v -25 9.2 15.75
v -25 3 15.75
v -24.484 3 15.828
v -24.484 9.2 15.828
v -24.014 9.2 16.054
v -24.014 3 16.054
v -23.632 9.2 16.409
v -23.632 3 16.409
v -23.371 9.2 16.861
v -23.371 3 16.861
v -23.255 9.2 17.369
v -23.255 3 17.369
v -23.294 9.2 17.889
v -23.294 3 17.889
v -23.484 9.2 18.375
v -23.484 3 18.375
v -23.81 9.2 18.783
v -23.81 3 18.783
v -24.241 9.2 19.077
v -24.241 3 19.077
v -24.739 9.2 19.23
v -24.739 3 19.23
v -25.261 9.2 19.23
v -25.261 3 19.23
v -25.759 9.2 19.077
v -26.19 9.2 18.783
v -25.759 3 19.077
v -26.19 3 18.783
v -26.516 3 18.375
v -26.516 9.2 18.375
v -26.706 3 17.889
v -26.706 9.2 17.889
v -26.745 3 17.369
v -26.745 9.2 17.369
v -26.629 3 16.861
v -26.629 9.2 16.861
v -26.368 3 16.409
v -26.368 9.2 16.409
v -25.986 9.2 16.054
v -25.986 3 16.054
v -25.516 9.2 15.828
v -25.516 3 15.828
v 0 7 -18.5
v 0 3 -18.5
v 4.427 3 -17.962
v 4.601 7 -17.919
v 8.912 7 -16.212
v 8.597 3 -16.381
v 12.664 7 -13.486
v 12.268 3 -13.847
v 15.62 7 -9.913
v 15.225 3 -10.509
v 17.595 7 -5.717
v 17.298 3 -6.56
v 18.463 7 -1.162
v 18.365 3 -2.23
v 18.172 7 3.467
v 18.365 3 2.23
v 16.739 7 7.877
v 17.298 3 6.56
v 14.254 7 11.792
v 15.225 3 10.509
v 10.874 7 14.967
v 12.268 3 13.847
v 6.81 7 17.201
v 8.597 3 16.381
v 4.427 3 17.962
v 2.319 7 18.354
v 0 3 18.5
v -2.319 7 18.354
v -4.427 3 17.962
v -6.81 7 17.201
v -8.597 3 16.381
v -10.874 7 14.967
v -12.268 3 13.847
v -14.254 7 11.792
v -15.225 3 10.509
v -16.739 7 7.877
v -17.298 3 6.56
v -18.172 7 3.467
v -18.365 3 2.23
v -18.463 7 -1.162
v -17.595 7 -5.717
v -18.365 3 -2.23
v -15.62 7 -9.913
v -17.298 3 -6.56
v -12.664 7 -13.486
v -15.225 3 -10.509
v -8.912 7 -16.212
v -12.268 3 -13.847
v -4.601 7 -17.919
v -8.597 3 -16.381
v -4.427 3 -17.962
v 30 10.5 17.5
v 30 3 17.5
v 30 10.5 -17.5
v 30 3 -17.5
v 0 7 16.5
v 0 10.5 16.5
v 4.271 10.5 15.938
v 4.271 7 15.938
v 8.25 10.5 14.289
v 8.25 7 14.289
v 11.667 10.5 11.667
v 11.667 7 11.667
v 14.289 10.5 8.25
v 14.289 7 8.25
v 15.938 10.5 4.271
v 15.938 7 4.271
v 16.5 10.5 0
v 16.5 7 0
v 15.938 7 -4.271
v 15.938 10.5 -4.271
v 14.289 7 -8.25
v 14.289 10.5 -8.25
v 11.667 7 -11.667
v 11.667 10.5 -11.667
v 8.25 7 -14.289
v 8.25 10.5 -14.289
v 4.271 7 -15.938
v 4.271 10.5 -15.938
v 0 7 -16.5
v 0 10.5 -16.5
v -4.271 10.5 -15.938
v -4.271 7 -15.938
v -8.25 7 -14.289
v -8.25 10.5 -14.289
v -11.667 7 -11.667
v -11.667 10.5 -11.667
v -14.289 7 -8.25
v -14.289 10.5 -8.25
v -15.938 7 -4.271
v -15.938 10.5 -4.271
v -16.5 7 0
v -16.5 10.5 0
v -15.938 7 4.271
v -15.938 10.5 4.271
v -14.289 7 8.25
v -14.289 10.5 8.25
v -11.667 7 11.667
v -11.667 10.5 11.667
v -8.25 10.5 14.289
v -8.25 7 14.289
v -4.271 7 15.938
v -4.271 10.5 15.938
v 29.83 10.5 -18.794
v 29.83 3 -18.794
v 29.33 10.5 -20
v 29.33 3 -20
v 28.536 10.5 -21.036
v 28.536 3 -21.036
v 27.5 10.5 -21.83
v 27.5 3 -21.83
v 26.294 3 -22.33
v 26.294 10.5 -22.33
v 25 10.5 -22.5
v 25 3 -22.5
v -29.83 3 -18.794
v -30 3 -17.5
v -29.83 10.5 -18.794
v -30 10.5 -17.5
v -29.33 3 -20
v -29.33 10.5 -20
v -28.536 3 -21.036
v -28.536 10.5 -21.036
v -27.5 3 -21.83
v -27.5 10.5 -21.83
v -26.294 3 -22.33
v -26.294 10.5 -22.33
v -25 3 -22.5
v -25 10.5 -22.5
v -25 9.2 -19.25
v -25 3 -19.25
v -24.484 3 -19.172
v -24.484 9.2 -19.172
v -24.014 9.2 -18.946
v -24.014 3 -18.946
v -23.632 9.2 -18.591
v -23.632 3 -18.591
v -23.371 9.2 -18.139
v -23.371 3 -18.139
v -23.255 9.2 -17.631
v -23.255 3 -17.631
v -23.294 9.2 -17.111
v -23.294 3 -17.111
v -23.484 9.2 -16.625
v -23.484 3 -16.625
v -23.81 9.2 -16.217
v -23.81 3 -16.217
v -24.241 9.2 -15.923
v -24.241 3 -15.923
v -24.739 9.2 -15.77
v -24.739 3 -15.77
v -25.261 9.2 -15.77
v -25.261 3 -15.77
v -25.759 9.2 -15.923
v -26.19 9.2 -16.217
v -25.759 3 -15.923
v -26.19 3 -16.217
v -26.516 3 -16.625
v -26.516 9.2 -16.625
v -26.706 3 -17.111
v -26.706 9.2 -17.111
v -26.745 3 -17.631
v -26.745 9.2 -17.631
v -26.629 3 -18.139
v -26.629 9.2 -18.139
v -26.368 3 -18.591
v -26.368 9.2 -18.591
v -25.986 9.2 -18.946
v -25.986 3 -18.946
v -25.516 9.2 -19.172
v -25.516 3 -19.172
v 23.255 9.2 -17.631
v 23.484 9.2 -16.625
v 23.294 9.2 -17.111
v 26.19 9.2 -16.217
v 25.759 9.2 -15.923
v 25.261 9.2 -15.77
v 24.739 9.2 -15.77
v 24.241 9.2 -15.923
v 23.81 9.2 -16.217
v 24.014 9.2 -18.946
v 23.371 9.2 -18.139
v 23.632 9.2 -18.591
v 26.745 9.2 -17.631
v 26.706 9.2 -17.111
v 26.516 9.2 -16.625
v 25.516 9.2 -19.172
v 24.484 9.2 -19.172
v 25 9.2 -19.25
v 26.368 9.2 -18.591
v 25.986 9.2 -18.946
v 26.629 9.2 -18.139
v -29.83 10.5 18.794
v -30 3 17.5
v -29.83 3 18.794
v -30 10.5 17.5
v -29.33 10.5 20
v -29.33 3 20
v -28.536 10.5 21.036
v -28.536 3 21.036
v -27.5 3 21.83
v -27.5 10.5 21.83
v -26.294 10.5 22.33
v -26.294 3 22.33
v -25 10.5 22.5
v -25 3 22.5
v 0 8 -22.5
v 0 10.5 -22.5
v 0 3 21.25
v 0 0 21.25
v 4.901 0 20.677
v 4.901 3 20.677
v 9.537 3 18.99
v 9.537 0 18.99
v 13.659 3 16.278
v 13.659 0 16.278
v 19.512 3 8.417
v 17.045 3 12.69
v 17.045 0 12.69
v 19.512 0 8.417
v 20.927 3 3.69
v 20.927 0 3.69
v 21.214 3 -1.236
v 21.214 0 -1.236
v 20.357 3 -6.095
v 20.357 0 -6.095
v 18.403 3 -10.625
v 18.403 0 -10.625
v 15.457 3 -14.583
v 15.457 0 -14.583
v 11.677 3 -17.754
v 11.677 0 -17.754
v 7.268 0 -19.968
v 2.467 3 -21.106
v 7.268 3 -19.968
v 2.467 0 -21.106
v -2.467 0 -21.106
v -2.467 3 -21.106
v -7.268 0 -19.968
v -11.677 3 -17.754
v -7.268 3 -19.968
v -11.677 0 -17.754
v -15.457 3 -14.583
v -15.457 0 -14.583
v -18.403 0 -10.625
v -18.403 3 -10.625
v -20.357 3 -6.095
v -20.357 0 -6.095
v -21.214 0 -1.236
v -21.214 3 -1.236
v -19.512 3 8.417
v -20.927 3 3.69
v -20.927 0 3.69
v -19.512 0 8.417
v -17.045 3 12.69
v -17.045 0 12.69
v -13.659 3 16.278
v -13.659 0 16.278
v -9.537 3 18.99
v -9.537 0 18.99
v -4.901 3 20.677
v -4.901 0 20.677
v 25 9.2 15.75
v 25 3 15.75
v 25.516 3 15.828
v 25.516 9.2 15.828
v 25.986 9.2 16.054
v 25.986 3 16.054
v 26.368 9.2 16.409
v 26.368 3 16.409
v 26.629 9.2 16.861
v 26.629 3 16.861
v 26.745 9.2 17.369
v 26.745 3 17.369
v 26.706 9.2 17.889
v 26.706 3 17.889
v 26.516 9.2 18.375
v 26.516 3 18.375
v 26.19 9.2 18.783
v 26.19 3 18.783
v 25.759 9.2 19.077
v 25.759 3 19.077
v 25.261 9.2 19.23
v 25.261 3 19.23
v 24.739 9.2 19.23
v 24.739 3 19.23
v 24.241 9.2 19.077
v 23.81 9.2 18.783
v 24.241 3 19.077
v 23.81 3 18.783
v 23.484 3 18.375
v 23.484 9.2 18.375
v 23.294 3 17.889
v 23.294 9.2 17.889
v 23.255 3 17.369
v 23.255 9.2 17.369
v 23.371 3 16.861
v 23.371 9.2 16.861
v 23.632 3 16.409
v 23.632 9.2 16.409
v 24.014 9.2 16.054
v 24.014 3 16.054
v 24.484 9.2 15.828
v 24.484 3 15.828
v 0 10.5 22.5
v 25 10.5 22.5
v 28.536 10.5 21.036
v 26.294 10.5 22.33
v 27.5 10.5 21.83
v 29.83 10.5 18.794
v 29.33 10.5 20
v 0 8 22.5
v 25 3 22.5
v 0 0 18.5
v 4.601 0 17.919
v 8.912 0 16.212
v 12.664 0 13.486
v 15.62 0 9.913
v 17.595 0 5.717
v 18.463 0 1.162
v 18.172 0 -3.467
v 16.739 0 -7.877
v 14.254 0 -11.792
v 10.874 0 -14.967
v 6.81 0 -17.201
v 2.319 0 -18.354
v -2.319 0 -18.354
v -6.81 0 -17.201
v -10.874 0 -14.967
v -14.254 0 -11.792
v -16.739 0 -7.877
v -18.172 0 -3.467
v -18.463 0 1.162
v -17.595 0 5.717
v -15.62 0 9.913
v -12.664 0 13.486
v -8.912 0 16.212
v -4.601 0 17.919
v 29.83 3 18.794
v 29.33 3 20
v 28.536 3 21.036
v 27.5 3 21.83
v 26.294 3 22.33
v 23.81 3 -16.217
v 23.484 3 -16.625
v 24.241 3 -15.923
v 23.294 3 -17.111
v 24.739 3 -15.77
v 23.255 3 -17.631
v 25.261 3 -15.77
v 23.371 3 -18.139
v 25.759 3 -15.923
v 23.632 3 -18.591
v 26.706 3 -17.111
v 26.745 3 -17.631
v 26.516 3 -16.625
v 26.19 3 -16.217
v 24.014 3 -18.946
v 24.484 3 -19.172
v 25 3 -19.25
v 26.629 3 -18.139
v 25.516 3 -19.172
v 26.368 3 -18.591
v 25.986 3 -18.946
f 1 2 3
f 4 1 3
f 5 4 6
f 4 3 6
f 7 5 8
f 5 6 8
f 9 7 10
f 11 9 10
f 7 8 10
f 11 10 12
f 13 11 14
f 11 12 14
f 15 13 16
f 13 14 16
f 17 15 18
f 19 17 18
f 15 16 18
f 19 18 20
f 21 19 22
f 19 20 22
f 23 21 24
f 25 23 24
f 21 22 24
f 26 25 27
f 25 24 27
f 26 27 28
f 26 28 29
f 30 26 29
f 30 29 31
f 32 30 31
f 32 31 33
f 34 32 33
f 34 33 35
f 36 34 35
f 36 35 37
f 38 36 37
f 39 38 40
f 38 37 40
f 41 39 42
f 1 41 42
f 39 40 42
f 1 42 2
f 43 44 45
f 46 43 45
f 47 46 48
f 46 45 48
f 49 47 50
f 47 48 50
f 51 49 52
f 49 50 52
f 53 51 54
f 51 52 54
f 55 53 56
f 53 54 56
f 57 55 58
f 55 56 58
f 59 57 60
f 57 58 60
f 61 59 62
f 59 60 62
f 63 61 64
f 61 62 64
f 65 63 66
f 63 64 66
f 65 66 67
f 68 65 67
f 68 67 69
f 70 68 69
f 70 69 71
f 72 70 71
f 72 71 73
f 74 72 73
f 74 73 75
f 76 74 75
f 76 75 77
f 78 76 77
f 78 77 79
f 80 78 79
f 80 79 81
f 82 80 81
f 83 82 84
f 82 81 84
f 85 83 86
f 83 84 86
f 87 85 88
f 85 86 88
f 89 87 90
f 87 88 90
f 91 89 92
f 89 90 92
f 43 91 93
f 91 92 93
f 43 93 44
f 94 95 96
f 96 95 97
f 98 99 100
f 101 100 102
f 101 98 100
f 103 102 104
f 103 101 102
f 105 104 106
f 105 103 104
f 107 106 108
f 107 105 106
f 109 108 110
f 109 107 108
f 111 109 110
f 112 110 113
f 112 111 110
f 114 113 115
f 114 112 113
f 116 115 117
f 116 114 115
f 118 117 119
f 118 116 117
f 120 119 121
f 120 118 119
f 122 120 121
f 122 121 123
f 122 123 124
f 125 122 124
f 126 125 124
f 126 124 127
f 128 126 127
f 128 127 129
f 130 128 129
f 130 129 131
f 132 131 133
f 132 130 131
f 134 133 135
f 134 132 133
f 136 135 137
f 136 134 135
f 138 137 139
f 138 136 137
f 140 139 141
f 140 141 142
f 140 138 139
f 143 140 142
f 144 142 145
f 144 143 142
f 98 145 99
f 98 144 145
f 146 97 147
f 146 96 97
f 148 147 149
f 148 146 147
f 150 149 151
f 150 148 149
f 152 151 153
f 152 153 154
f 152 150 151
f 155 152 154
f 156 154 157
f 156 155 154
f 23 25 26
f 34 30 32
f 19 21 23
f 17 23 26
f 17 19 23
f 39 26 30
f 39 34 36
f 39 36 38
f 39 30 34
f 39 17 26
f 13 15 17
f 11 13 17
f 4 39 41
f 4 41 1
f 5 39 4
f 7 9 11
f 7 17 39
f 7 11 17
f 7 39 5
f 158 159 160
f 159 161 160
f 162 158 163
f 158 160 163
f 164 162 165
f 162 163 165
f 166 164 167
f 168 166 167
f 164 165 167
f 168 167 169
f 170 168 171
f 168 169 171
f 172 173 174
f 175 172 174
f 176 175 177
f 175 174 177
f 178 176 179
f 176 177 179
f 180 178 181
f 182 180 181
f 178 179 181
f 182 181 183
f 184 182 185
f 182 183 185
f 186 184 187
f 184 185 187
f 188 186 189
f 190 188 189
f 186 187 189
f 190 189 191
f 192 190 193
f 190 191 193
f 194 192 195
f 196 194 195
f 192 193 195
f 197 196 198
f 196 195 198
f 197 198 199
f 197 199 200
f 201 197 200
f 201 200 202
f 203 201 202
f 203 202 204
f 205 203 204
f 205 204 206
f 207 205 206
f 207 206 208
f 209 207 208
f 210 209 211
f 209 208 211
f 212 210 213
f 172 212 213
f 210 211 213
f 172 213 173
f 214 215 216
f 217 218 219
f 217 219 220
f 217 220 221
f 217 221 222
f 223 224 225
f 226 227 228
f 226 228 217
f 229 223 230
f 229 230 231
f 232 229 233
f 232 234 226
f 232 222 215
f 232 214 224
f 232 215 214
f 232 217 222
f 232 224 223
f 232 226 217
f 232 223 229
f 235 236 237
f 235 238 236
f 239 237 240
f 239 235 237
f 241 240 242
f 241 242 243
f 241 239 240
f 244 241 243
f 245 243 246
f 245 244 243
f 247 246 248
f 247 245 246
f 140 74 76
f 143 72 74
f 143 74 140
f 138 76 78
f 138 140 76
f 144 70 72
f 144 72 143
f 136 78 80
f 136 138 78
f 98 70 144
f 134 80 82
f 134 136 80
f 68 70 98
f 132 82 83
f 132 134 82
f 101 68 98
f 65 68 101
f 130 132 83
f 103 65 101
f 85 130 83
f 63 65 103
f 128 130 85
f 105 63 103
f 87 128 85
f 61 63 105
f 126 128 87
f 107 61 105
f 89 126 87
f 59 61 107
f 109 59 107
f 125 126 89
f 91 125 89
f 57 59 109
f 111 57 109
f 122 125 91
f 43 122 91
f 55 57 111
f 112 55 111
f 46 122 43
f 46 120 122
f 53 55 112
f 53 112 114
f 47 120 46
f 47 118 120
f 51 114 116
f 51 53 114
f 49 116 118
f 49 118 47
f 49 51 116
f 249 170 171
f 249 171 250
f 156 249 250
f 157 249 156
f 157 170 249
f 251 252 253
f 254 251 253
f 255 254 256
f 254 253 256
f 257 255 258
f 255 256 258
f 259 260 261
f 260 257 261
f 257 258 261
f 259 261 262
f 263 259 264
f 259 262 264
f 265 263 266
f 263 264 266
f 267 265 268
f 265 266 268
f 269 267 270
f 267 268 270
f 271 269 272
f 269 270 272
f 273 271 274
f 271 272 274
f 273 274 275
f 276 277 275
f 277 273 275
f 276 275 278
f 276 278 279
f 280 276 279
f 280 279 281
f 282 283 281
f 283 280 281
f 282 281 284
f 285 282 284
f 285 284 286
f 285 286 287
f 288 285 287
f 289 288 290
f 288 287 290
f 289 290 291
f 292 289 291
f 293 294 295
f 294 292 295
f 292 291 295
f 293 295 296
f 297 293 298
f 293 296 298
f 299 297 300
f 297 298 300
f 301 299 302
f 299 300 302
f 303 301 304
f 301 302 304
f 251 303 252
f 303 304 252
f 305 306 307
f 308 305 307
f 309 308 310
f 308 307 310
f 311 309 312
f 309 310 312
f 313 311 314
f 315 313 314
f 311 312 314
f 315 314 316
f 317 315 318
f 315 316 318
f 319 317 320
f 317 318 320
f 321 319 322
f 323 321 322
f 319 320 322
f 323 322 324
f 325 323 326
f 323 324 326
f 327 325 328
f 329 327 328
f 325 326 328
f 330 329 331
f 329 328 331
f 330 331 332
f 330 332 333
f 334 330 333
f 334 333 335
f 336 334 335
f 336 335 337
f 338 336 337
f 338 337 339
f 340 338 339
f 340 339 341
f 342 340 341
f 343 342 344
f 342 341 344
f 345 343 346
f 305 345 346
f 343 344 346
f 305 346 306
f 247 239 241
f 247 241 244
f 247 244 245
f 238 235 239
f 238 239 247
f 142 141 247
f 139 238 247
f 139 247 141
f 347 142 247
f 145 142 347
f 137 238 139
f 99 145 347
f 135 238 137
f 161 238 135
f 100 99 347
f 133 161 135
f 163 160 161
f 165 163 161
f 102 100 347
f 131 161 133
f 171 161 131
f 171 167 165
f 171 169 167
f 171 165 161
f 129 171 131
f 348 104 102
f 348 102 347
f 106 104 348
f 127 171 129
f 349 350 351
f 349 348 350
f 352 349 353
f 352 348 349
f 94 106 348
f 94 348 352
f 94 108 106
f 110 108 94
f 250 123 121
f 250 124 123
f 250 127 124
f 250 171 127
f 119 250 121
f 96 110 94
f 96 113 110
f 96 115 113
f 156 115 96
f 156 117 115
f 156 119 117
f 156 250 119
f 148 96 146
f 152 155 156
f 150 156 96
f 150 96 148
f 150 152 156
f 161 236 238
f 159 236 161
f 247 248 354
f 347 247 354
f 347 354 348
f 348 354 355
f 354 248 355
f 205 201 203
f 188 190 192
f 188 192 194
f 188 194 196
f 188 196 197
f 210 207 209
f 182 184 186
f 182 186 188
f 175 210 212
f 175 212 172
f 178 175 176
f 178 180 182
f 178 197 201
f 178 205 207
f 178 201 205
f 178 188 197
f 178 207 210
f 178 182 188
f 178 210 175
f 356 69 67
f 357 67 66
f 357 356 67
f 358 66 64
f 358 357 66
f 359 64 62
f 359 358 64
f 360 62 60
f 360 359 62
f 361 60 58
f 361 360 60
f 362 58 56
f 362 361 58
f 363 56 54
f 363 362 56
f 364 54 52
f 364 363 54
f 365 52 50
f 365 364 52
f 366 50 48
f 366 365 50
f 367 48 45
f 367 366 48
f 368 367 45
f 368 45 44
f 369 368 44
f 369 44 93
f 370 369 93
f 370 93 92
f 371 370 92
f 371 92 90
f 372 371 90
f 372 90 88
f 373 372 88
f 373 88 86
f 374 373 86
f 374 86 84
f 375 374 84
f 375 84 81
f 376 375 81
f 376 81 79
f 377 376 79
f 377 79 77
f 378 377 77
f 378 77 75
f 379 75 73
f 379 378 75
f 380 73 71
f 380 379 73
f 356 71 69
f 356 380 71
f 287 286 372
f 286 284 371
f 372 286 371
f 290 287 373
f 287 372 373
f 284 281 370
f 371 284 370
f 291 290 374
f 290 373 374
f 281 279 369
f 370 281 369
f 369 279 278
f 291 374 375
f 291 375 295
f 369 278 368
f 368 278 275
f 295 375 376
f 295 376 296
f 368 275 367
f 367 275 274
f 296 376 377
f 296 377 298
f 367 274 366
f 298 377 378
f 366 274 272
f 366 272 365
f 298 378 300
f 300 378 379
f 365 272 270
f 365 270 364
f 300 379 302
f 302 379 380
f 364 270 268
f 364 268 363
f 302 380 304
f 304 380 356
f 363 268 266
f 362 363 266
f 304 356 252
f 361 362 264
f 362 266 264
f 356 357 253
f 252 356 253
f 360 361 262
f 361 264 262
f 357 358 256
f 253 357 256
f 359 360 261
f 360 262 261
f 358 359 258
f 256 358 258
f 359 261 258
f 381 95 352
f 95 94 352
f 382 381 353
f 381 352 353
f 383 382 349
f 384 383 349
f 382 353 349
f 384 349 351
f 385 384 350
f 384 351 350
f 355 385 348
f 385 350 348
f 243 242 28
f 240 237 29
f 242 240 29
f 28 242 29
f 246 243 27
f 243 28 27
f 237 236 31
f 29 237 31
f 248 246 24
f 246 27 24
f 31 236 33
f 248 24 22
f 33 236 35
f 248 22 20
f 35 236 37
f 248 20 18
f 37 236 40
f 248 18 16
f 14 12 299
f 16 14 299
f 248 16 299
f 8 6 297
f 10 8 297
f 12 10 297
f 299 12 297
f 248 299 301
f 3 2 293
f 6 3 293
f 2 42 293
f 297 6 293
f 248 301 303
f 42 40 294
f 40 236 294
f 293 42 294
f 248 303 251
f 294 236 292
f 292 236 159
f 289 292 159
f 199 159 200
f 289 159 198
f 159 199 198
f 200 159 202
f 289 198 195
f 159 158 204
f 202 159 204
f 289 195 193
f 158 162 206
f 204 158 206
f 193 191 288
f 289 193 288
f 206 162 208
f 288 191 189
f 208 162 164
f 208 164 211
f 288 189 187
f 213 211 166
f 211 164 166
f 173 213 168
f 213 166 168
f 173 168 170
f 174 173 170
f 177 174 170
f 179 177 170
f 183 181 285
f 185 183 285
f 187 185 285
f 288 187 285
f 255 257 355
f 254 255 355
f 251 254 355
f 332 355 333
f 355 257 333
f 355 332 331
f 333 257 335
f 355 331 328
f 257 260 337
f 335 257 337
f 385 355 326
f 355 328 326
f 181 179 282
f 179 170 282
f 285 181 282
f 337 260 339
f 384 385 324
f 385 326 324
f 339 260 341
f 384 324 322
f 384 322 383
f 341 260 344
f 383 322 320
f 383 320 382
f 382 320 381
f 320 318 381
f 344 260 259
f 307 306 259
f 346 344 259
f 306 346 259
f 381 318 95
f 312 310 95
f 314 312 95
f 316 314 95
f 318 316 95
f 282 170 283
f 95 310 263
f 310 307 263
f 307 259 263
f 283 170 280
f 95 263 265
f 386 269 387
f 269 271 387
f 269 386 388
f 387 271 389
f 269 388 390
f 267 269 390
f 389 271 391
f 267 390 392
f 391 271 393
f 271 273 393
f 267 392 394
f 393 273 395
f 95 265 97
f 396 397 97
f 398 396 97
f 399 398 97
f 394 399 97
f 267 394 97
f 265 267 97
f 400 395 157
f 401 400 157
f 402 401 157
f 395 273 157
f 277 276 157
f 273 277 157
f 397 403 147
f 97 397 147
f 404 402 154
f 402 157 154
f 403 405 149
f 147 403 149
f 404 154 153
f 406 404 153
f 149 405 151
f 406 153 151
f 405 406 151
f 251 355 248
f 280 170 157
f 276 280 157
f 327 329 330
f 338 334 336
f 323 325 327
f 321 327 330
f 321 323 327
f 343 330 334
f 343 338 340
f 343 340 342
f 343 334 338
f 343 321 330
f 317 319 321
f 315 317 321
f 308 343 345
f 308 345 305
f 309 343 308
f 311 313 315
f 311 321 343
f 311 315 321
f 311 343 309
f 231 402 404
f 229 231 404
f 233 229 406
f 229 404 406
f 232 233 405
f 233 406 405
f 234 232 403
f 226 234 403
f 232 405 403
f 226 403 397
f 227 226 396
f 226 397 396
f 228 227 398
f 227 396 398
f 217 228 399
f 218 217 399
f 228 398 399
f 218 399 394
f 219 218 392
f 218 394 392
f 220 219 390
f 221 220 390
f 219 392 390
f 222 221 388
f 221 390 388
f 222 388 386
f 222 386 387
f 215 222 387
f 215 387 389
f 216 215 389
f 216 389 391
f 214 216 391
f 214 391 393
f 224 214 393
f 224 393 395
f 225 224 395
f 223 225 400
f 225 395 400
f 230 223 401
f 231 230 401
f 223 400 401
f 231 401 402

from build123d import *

# Parameters (mm, degrees)
SKETCH1_R           = 21.25
SKETCH1_R_2         = 18.5
BOSS_EXTRUDE1_DEPTH = 8
SKETCH2_R           = 22.5
SKETCH2_R_2         = 16.5
BOSS_EXTRUDE2_DEPTH = 2.5
BOSS_EXTRUDE3_START = -7.5
SKETCH3_W           = 60
SKETCH3_H           = 45
SKETCH3_R           = 16.5
BOSS_EXTRUDE3_DEPTH = 7.5
FILLET2_R           = 5
SKETCH4_R           = 18.5
CUT_EXTRUDE1_DEPTH  = 4
SKETCH5_R           = 1.75
CUT_EXTRUDE2_DEPTH  = 6.2


with BuildPart() as part:
    # Sketch1 → Boss-Extrude1 (new body)
    with BuildSketch(Plane(origin=(0, 0, 0), x_dir=(1, 0, 0), z_dir=(0, 1, 0))):
        with Locations(Location((0, 0, 0), (0, 0, 270))):
            Circle(SKETCH1_R)
        with Locations(Location((0, 0, 0), (0, 0, 270))):
            Circle(SKETCH1_R_2, mode=Mode.SUBTRACT)
    extrude(amount=BOSS_EXTRUDE1_DEPTH)

    # Sketch2 → Boss-Extrude2 (add)
    with BuildSketch(Plane(origin=(0, 8, 0), x_dir=(1, 0, 0), z_dir=(0, 1, 0))):
        with Locations(Location((0, 0, 0), (0, 0, 270))):
            Circle(SKETCH2_R)
        with Locations(Location((0, 0, 0), (0, 0, 270))):
            Circle(SKETCH2_R_2, mode=Mode.SUBTRACT)
    extrude(amount=BOSS_EXTRUDE2_DEPTH)

    # Sketch3 → Boss-Extrude3 (add)
    with BuildSketch(Plane(origin=(0, 10.5, 0), x_dir=(1, 0, 0), z_dir=(0, 1, 0)).offset(BOSS_EXTRUDE3_START)):
        Rectangle(SKETCH3_W, SKETCH3_H)
        with Locations(Location((0, 0, 0), (0, 0, 270))):
            Circle(SKETCH3_R, mode=Mode.SUBTRACT)
    extrude(amount=BOSS_EXTRUDE3_DEPTH)

    # Fillet2
    fillet2_edges = [part.edges().sort_by_distance(p)[0] for p in [
        (30, 6.75, -22.5),
        (30, 6.75, 22.5),
        (-30, 6.75, 22.5),
        (-30, 6.75, -22.5),
    ]]
    fillet(fillet2_edges, radius=FILLET2_R)

    # Sketch4 → Cut-Extrude1 (cut)
    with BuildSketch(Plane(origin=(0, 3, 0), x_dir=(-1, 0, 0), z_dir=(0, -1, 0))):
        with Locations(Location((0, 0, 0), (0, 0, 90))):
            Circle(SKETCH4_R)
    extrude(amount=-CUT_EXTRUDE1_DEPTH, mode=Mode.SUBTRACT)

    # Sketch5 → Cut-Extrude2 (cut)
    with BuildSketch(Plane(origin=(0, 3, 0), x_dir=(-1, 0, 0), z_dir=(0, -1, 0))):
        with Locations(Location((25, -17.5, 0), (0, 0, 90))):
            Circle(SKETCH5_R)
        with Locations(Location((-25, -17.5, 0), (0, 0, 90))):
            Circle(SKETCH5_R)
        with Locations(Location((-25, 17.5, 0), (0, 0, 90))):
            Circle(SKETCH5_R)
        with Locations(Location((25, 17.5, 0), (0, 0, 90))):
            Circle(SKETCH5_R)
    extrude(amount=-CUT_EXTRUDE2_DEPTH, mode=Mode.SUBTRACT)


solid = part.part
